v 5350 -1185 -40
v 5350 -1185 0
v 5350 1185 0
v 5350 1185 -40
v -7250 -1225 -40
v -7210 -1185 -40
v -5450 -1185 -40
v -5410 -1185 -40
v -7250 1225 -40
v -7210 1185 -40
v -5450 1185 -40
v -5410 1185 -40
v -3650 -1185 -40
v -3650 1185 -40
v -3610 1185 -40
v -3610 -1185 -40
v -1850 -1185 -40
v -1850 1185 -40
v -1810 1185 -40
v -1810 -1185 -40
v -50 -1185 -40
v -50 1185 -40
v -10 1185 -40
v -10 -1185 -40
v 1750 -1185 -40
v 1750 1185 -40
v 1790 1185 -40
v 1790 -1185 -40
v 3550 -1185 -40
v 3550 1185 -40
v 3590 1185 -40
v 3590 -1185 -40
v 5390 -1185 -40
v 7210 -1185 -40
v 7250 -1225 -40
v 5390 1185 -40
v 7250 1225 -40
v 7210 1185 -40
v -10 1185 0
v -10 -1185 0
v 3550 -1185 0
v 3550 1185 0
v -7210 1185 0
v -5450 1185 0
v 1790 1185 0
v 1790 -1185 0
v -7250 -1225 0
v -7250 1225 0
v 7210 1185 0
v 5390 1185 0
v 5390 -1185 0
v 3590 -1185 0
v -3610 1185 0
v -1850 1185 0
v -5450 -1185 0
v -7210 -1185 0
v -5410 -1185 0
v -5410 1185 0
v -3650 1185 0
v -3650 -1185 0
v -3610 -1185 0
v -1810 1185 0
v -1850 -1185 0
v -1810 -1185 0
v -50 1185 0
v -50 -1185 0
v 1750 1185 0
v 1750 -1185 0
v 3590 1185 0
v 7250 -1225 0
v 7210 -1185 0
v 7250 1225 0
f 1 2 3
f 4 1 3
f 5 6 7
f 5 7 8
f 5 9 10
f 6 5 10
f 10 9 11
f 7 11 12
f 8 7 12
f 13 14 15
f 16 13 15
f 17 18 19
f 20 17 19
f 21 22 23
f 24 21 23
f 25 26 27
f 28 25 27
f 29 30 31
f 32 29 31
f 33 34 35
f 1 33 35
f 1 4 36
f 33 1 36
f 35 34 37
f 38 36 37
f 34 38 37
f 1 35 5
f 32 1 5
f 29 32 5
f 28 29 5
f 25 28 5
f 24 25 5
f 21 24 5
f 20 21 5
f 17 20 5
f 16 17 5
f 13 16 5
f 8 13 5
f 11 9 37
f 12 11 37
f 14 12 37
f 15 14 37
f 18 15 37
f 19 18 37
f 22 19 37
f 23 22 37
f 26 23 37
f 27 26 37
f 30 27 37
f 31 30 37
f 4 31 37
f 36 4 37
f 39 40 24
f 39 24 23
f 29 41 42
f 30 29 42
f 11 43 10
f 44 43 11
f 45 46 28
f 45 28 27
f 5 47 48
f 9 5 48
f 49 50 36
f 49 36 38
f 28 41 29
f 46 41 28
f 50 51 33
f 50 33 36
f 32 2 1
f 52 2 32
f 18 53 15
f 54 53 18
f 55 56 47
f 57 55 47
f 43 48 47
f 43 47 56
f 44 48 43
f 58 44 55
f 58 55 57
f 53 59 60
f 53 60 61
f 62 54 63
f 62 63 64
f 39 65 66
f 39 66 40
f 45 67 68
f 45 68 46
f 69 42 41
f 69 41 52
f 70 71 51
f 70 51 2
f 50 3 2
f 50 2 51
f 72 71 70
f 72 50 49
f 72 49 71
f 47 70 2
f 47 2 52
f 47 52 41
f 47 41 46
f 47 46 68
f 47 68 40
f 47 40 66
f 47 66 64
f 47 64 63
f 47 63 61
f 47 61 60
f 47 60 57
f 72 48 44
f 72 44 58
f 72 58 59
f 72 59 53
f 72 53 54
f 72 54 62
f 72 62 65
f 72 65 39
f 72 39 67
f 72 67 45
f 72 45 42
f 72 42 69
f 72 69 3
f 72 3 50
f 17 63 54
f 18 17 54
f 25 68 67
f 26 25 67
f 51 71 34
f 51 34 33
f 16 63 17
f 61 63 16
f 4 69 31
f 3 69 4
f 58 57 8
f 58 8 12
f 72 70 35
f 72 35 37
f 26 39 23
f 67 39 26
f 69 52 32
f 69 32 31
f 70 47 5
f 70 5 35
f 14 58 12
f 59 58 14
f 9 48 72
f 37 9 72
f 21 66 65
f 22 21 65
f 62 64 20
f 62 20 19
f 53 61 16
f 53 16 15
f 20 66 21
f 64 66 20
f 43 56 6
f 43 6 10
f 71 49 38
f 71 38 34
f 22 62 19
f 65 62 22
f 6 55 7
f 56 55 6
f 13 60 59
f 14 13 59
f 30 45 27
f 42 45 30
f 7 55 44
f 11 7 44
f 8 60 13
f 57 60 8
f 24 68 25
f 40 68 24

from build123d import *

# Parameters (mm, degrees)
F0_W     = 14500
F0_H     = 2450
F0_W_2   = 40
F0_H_2   = 2370
F1_DEPTH = 40


with BuildPart() as f1:
    # F0 (on Top) → F1 (new body)
    with BuildSketch(Plane.XY):
        Rectangle(F0_W, F0_H)
        Polygon((5390, 1185), (7210, 1185), (7210, -1185), (5390, -1185), (5350, -1185), (3590, -1185), (3550, -1185), (1790, -1185), (1750, -1185), (-10, -1185), (-50, -1185), (-1810, -1185), (-1850, -1185), (-3610, -1185), (-3650, -1185), (-5410, -1185), (-5450, -1185), (-7210, -1185), (-7210, 1185), (-5450, 1185), (-5410, 1185), (-3650, 1185), (-3610, 1185), (-1850, 1185), (-1810, 1185), (-50, 1185), (-10, 1185), (1750, 1185), (1790, 1185), (3550, 1185), (3590, 1185), (5350, 1185), align=None, mode=Mode.SUBTRACT)
        with Locations((-5430, 0)):
            Rectangle(F0_W_2, F0_H_2)
        with Locations((-3630, 0)):
            Rectangle(F0_W_2, F0_H_2)
        with Locations((-1830, 0)):
            Rectangle(F0_W_2, F0_H_2)
        with Locations((-30, 0)):
            Rectangle(F0_W_2, F0_H_2)
        with Locations((1770, 0)):
            Rectangle(F0_W_2, F0_H_2)
        with Locations((3570, 0)):
            Rectangle(F0_W_2, F0_H_2)
        with Locations((5370, 0)):
            Rectangle(F0_W_2, F0_H_2)
    extrude(amount=-F1_DEPTH)


solid = f1.part
